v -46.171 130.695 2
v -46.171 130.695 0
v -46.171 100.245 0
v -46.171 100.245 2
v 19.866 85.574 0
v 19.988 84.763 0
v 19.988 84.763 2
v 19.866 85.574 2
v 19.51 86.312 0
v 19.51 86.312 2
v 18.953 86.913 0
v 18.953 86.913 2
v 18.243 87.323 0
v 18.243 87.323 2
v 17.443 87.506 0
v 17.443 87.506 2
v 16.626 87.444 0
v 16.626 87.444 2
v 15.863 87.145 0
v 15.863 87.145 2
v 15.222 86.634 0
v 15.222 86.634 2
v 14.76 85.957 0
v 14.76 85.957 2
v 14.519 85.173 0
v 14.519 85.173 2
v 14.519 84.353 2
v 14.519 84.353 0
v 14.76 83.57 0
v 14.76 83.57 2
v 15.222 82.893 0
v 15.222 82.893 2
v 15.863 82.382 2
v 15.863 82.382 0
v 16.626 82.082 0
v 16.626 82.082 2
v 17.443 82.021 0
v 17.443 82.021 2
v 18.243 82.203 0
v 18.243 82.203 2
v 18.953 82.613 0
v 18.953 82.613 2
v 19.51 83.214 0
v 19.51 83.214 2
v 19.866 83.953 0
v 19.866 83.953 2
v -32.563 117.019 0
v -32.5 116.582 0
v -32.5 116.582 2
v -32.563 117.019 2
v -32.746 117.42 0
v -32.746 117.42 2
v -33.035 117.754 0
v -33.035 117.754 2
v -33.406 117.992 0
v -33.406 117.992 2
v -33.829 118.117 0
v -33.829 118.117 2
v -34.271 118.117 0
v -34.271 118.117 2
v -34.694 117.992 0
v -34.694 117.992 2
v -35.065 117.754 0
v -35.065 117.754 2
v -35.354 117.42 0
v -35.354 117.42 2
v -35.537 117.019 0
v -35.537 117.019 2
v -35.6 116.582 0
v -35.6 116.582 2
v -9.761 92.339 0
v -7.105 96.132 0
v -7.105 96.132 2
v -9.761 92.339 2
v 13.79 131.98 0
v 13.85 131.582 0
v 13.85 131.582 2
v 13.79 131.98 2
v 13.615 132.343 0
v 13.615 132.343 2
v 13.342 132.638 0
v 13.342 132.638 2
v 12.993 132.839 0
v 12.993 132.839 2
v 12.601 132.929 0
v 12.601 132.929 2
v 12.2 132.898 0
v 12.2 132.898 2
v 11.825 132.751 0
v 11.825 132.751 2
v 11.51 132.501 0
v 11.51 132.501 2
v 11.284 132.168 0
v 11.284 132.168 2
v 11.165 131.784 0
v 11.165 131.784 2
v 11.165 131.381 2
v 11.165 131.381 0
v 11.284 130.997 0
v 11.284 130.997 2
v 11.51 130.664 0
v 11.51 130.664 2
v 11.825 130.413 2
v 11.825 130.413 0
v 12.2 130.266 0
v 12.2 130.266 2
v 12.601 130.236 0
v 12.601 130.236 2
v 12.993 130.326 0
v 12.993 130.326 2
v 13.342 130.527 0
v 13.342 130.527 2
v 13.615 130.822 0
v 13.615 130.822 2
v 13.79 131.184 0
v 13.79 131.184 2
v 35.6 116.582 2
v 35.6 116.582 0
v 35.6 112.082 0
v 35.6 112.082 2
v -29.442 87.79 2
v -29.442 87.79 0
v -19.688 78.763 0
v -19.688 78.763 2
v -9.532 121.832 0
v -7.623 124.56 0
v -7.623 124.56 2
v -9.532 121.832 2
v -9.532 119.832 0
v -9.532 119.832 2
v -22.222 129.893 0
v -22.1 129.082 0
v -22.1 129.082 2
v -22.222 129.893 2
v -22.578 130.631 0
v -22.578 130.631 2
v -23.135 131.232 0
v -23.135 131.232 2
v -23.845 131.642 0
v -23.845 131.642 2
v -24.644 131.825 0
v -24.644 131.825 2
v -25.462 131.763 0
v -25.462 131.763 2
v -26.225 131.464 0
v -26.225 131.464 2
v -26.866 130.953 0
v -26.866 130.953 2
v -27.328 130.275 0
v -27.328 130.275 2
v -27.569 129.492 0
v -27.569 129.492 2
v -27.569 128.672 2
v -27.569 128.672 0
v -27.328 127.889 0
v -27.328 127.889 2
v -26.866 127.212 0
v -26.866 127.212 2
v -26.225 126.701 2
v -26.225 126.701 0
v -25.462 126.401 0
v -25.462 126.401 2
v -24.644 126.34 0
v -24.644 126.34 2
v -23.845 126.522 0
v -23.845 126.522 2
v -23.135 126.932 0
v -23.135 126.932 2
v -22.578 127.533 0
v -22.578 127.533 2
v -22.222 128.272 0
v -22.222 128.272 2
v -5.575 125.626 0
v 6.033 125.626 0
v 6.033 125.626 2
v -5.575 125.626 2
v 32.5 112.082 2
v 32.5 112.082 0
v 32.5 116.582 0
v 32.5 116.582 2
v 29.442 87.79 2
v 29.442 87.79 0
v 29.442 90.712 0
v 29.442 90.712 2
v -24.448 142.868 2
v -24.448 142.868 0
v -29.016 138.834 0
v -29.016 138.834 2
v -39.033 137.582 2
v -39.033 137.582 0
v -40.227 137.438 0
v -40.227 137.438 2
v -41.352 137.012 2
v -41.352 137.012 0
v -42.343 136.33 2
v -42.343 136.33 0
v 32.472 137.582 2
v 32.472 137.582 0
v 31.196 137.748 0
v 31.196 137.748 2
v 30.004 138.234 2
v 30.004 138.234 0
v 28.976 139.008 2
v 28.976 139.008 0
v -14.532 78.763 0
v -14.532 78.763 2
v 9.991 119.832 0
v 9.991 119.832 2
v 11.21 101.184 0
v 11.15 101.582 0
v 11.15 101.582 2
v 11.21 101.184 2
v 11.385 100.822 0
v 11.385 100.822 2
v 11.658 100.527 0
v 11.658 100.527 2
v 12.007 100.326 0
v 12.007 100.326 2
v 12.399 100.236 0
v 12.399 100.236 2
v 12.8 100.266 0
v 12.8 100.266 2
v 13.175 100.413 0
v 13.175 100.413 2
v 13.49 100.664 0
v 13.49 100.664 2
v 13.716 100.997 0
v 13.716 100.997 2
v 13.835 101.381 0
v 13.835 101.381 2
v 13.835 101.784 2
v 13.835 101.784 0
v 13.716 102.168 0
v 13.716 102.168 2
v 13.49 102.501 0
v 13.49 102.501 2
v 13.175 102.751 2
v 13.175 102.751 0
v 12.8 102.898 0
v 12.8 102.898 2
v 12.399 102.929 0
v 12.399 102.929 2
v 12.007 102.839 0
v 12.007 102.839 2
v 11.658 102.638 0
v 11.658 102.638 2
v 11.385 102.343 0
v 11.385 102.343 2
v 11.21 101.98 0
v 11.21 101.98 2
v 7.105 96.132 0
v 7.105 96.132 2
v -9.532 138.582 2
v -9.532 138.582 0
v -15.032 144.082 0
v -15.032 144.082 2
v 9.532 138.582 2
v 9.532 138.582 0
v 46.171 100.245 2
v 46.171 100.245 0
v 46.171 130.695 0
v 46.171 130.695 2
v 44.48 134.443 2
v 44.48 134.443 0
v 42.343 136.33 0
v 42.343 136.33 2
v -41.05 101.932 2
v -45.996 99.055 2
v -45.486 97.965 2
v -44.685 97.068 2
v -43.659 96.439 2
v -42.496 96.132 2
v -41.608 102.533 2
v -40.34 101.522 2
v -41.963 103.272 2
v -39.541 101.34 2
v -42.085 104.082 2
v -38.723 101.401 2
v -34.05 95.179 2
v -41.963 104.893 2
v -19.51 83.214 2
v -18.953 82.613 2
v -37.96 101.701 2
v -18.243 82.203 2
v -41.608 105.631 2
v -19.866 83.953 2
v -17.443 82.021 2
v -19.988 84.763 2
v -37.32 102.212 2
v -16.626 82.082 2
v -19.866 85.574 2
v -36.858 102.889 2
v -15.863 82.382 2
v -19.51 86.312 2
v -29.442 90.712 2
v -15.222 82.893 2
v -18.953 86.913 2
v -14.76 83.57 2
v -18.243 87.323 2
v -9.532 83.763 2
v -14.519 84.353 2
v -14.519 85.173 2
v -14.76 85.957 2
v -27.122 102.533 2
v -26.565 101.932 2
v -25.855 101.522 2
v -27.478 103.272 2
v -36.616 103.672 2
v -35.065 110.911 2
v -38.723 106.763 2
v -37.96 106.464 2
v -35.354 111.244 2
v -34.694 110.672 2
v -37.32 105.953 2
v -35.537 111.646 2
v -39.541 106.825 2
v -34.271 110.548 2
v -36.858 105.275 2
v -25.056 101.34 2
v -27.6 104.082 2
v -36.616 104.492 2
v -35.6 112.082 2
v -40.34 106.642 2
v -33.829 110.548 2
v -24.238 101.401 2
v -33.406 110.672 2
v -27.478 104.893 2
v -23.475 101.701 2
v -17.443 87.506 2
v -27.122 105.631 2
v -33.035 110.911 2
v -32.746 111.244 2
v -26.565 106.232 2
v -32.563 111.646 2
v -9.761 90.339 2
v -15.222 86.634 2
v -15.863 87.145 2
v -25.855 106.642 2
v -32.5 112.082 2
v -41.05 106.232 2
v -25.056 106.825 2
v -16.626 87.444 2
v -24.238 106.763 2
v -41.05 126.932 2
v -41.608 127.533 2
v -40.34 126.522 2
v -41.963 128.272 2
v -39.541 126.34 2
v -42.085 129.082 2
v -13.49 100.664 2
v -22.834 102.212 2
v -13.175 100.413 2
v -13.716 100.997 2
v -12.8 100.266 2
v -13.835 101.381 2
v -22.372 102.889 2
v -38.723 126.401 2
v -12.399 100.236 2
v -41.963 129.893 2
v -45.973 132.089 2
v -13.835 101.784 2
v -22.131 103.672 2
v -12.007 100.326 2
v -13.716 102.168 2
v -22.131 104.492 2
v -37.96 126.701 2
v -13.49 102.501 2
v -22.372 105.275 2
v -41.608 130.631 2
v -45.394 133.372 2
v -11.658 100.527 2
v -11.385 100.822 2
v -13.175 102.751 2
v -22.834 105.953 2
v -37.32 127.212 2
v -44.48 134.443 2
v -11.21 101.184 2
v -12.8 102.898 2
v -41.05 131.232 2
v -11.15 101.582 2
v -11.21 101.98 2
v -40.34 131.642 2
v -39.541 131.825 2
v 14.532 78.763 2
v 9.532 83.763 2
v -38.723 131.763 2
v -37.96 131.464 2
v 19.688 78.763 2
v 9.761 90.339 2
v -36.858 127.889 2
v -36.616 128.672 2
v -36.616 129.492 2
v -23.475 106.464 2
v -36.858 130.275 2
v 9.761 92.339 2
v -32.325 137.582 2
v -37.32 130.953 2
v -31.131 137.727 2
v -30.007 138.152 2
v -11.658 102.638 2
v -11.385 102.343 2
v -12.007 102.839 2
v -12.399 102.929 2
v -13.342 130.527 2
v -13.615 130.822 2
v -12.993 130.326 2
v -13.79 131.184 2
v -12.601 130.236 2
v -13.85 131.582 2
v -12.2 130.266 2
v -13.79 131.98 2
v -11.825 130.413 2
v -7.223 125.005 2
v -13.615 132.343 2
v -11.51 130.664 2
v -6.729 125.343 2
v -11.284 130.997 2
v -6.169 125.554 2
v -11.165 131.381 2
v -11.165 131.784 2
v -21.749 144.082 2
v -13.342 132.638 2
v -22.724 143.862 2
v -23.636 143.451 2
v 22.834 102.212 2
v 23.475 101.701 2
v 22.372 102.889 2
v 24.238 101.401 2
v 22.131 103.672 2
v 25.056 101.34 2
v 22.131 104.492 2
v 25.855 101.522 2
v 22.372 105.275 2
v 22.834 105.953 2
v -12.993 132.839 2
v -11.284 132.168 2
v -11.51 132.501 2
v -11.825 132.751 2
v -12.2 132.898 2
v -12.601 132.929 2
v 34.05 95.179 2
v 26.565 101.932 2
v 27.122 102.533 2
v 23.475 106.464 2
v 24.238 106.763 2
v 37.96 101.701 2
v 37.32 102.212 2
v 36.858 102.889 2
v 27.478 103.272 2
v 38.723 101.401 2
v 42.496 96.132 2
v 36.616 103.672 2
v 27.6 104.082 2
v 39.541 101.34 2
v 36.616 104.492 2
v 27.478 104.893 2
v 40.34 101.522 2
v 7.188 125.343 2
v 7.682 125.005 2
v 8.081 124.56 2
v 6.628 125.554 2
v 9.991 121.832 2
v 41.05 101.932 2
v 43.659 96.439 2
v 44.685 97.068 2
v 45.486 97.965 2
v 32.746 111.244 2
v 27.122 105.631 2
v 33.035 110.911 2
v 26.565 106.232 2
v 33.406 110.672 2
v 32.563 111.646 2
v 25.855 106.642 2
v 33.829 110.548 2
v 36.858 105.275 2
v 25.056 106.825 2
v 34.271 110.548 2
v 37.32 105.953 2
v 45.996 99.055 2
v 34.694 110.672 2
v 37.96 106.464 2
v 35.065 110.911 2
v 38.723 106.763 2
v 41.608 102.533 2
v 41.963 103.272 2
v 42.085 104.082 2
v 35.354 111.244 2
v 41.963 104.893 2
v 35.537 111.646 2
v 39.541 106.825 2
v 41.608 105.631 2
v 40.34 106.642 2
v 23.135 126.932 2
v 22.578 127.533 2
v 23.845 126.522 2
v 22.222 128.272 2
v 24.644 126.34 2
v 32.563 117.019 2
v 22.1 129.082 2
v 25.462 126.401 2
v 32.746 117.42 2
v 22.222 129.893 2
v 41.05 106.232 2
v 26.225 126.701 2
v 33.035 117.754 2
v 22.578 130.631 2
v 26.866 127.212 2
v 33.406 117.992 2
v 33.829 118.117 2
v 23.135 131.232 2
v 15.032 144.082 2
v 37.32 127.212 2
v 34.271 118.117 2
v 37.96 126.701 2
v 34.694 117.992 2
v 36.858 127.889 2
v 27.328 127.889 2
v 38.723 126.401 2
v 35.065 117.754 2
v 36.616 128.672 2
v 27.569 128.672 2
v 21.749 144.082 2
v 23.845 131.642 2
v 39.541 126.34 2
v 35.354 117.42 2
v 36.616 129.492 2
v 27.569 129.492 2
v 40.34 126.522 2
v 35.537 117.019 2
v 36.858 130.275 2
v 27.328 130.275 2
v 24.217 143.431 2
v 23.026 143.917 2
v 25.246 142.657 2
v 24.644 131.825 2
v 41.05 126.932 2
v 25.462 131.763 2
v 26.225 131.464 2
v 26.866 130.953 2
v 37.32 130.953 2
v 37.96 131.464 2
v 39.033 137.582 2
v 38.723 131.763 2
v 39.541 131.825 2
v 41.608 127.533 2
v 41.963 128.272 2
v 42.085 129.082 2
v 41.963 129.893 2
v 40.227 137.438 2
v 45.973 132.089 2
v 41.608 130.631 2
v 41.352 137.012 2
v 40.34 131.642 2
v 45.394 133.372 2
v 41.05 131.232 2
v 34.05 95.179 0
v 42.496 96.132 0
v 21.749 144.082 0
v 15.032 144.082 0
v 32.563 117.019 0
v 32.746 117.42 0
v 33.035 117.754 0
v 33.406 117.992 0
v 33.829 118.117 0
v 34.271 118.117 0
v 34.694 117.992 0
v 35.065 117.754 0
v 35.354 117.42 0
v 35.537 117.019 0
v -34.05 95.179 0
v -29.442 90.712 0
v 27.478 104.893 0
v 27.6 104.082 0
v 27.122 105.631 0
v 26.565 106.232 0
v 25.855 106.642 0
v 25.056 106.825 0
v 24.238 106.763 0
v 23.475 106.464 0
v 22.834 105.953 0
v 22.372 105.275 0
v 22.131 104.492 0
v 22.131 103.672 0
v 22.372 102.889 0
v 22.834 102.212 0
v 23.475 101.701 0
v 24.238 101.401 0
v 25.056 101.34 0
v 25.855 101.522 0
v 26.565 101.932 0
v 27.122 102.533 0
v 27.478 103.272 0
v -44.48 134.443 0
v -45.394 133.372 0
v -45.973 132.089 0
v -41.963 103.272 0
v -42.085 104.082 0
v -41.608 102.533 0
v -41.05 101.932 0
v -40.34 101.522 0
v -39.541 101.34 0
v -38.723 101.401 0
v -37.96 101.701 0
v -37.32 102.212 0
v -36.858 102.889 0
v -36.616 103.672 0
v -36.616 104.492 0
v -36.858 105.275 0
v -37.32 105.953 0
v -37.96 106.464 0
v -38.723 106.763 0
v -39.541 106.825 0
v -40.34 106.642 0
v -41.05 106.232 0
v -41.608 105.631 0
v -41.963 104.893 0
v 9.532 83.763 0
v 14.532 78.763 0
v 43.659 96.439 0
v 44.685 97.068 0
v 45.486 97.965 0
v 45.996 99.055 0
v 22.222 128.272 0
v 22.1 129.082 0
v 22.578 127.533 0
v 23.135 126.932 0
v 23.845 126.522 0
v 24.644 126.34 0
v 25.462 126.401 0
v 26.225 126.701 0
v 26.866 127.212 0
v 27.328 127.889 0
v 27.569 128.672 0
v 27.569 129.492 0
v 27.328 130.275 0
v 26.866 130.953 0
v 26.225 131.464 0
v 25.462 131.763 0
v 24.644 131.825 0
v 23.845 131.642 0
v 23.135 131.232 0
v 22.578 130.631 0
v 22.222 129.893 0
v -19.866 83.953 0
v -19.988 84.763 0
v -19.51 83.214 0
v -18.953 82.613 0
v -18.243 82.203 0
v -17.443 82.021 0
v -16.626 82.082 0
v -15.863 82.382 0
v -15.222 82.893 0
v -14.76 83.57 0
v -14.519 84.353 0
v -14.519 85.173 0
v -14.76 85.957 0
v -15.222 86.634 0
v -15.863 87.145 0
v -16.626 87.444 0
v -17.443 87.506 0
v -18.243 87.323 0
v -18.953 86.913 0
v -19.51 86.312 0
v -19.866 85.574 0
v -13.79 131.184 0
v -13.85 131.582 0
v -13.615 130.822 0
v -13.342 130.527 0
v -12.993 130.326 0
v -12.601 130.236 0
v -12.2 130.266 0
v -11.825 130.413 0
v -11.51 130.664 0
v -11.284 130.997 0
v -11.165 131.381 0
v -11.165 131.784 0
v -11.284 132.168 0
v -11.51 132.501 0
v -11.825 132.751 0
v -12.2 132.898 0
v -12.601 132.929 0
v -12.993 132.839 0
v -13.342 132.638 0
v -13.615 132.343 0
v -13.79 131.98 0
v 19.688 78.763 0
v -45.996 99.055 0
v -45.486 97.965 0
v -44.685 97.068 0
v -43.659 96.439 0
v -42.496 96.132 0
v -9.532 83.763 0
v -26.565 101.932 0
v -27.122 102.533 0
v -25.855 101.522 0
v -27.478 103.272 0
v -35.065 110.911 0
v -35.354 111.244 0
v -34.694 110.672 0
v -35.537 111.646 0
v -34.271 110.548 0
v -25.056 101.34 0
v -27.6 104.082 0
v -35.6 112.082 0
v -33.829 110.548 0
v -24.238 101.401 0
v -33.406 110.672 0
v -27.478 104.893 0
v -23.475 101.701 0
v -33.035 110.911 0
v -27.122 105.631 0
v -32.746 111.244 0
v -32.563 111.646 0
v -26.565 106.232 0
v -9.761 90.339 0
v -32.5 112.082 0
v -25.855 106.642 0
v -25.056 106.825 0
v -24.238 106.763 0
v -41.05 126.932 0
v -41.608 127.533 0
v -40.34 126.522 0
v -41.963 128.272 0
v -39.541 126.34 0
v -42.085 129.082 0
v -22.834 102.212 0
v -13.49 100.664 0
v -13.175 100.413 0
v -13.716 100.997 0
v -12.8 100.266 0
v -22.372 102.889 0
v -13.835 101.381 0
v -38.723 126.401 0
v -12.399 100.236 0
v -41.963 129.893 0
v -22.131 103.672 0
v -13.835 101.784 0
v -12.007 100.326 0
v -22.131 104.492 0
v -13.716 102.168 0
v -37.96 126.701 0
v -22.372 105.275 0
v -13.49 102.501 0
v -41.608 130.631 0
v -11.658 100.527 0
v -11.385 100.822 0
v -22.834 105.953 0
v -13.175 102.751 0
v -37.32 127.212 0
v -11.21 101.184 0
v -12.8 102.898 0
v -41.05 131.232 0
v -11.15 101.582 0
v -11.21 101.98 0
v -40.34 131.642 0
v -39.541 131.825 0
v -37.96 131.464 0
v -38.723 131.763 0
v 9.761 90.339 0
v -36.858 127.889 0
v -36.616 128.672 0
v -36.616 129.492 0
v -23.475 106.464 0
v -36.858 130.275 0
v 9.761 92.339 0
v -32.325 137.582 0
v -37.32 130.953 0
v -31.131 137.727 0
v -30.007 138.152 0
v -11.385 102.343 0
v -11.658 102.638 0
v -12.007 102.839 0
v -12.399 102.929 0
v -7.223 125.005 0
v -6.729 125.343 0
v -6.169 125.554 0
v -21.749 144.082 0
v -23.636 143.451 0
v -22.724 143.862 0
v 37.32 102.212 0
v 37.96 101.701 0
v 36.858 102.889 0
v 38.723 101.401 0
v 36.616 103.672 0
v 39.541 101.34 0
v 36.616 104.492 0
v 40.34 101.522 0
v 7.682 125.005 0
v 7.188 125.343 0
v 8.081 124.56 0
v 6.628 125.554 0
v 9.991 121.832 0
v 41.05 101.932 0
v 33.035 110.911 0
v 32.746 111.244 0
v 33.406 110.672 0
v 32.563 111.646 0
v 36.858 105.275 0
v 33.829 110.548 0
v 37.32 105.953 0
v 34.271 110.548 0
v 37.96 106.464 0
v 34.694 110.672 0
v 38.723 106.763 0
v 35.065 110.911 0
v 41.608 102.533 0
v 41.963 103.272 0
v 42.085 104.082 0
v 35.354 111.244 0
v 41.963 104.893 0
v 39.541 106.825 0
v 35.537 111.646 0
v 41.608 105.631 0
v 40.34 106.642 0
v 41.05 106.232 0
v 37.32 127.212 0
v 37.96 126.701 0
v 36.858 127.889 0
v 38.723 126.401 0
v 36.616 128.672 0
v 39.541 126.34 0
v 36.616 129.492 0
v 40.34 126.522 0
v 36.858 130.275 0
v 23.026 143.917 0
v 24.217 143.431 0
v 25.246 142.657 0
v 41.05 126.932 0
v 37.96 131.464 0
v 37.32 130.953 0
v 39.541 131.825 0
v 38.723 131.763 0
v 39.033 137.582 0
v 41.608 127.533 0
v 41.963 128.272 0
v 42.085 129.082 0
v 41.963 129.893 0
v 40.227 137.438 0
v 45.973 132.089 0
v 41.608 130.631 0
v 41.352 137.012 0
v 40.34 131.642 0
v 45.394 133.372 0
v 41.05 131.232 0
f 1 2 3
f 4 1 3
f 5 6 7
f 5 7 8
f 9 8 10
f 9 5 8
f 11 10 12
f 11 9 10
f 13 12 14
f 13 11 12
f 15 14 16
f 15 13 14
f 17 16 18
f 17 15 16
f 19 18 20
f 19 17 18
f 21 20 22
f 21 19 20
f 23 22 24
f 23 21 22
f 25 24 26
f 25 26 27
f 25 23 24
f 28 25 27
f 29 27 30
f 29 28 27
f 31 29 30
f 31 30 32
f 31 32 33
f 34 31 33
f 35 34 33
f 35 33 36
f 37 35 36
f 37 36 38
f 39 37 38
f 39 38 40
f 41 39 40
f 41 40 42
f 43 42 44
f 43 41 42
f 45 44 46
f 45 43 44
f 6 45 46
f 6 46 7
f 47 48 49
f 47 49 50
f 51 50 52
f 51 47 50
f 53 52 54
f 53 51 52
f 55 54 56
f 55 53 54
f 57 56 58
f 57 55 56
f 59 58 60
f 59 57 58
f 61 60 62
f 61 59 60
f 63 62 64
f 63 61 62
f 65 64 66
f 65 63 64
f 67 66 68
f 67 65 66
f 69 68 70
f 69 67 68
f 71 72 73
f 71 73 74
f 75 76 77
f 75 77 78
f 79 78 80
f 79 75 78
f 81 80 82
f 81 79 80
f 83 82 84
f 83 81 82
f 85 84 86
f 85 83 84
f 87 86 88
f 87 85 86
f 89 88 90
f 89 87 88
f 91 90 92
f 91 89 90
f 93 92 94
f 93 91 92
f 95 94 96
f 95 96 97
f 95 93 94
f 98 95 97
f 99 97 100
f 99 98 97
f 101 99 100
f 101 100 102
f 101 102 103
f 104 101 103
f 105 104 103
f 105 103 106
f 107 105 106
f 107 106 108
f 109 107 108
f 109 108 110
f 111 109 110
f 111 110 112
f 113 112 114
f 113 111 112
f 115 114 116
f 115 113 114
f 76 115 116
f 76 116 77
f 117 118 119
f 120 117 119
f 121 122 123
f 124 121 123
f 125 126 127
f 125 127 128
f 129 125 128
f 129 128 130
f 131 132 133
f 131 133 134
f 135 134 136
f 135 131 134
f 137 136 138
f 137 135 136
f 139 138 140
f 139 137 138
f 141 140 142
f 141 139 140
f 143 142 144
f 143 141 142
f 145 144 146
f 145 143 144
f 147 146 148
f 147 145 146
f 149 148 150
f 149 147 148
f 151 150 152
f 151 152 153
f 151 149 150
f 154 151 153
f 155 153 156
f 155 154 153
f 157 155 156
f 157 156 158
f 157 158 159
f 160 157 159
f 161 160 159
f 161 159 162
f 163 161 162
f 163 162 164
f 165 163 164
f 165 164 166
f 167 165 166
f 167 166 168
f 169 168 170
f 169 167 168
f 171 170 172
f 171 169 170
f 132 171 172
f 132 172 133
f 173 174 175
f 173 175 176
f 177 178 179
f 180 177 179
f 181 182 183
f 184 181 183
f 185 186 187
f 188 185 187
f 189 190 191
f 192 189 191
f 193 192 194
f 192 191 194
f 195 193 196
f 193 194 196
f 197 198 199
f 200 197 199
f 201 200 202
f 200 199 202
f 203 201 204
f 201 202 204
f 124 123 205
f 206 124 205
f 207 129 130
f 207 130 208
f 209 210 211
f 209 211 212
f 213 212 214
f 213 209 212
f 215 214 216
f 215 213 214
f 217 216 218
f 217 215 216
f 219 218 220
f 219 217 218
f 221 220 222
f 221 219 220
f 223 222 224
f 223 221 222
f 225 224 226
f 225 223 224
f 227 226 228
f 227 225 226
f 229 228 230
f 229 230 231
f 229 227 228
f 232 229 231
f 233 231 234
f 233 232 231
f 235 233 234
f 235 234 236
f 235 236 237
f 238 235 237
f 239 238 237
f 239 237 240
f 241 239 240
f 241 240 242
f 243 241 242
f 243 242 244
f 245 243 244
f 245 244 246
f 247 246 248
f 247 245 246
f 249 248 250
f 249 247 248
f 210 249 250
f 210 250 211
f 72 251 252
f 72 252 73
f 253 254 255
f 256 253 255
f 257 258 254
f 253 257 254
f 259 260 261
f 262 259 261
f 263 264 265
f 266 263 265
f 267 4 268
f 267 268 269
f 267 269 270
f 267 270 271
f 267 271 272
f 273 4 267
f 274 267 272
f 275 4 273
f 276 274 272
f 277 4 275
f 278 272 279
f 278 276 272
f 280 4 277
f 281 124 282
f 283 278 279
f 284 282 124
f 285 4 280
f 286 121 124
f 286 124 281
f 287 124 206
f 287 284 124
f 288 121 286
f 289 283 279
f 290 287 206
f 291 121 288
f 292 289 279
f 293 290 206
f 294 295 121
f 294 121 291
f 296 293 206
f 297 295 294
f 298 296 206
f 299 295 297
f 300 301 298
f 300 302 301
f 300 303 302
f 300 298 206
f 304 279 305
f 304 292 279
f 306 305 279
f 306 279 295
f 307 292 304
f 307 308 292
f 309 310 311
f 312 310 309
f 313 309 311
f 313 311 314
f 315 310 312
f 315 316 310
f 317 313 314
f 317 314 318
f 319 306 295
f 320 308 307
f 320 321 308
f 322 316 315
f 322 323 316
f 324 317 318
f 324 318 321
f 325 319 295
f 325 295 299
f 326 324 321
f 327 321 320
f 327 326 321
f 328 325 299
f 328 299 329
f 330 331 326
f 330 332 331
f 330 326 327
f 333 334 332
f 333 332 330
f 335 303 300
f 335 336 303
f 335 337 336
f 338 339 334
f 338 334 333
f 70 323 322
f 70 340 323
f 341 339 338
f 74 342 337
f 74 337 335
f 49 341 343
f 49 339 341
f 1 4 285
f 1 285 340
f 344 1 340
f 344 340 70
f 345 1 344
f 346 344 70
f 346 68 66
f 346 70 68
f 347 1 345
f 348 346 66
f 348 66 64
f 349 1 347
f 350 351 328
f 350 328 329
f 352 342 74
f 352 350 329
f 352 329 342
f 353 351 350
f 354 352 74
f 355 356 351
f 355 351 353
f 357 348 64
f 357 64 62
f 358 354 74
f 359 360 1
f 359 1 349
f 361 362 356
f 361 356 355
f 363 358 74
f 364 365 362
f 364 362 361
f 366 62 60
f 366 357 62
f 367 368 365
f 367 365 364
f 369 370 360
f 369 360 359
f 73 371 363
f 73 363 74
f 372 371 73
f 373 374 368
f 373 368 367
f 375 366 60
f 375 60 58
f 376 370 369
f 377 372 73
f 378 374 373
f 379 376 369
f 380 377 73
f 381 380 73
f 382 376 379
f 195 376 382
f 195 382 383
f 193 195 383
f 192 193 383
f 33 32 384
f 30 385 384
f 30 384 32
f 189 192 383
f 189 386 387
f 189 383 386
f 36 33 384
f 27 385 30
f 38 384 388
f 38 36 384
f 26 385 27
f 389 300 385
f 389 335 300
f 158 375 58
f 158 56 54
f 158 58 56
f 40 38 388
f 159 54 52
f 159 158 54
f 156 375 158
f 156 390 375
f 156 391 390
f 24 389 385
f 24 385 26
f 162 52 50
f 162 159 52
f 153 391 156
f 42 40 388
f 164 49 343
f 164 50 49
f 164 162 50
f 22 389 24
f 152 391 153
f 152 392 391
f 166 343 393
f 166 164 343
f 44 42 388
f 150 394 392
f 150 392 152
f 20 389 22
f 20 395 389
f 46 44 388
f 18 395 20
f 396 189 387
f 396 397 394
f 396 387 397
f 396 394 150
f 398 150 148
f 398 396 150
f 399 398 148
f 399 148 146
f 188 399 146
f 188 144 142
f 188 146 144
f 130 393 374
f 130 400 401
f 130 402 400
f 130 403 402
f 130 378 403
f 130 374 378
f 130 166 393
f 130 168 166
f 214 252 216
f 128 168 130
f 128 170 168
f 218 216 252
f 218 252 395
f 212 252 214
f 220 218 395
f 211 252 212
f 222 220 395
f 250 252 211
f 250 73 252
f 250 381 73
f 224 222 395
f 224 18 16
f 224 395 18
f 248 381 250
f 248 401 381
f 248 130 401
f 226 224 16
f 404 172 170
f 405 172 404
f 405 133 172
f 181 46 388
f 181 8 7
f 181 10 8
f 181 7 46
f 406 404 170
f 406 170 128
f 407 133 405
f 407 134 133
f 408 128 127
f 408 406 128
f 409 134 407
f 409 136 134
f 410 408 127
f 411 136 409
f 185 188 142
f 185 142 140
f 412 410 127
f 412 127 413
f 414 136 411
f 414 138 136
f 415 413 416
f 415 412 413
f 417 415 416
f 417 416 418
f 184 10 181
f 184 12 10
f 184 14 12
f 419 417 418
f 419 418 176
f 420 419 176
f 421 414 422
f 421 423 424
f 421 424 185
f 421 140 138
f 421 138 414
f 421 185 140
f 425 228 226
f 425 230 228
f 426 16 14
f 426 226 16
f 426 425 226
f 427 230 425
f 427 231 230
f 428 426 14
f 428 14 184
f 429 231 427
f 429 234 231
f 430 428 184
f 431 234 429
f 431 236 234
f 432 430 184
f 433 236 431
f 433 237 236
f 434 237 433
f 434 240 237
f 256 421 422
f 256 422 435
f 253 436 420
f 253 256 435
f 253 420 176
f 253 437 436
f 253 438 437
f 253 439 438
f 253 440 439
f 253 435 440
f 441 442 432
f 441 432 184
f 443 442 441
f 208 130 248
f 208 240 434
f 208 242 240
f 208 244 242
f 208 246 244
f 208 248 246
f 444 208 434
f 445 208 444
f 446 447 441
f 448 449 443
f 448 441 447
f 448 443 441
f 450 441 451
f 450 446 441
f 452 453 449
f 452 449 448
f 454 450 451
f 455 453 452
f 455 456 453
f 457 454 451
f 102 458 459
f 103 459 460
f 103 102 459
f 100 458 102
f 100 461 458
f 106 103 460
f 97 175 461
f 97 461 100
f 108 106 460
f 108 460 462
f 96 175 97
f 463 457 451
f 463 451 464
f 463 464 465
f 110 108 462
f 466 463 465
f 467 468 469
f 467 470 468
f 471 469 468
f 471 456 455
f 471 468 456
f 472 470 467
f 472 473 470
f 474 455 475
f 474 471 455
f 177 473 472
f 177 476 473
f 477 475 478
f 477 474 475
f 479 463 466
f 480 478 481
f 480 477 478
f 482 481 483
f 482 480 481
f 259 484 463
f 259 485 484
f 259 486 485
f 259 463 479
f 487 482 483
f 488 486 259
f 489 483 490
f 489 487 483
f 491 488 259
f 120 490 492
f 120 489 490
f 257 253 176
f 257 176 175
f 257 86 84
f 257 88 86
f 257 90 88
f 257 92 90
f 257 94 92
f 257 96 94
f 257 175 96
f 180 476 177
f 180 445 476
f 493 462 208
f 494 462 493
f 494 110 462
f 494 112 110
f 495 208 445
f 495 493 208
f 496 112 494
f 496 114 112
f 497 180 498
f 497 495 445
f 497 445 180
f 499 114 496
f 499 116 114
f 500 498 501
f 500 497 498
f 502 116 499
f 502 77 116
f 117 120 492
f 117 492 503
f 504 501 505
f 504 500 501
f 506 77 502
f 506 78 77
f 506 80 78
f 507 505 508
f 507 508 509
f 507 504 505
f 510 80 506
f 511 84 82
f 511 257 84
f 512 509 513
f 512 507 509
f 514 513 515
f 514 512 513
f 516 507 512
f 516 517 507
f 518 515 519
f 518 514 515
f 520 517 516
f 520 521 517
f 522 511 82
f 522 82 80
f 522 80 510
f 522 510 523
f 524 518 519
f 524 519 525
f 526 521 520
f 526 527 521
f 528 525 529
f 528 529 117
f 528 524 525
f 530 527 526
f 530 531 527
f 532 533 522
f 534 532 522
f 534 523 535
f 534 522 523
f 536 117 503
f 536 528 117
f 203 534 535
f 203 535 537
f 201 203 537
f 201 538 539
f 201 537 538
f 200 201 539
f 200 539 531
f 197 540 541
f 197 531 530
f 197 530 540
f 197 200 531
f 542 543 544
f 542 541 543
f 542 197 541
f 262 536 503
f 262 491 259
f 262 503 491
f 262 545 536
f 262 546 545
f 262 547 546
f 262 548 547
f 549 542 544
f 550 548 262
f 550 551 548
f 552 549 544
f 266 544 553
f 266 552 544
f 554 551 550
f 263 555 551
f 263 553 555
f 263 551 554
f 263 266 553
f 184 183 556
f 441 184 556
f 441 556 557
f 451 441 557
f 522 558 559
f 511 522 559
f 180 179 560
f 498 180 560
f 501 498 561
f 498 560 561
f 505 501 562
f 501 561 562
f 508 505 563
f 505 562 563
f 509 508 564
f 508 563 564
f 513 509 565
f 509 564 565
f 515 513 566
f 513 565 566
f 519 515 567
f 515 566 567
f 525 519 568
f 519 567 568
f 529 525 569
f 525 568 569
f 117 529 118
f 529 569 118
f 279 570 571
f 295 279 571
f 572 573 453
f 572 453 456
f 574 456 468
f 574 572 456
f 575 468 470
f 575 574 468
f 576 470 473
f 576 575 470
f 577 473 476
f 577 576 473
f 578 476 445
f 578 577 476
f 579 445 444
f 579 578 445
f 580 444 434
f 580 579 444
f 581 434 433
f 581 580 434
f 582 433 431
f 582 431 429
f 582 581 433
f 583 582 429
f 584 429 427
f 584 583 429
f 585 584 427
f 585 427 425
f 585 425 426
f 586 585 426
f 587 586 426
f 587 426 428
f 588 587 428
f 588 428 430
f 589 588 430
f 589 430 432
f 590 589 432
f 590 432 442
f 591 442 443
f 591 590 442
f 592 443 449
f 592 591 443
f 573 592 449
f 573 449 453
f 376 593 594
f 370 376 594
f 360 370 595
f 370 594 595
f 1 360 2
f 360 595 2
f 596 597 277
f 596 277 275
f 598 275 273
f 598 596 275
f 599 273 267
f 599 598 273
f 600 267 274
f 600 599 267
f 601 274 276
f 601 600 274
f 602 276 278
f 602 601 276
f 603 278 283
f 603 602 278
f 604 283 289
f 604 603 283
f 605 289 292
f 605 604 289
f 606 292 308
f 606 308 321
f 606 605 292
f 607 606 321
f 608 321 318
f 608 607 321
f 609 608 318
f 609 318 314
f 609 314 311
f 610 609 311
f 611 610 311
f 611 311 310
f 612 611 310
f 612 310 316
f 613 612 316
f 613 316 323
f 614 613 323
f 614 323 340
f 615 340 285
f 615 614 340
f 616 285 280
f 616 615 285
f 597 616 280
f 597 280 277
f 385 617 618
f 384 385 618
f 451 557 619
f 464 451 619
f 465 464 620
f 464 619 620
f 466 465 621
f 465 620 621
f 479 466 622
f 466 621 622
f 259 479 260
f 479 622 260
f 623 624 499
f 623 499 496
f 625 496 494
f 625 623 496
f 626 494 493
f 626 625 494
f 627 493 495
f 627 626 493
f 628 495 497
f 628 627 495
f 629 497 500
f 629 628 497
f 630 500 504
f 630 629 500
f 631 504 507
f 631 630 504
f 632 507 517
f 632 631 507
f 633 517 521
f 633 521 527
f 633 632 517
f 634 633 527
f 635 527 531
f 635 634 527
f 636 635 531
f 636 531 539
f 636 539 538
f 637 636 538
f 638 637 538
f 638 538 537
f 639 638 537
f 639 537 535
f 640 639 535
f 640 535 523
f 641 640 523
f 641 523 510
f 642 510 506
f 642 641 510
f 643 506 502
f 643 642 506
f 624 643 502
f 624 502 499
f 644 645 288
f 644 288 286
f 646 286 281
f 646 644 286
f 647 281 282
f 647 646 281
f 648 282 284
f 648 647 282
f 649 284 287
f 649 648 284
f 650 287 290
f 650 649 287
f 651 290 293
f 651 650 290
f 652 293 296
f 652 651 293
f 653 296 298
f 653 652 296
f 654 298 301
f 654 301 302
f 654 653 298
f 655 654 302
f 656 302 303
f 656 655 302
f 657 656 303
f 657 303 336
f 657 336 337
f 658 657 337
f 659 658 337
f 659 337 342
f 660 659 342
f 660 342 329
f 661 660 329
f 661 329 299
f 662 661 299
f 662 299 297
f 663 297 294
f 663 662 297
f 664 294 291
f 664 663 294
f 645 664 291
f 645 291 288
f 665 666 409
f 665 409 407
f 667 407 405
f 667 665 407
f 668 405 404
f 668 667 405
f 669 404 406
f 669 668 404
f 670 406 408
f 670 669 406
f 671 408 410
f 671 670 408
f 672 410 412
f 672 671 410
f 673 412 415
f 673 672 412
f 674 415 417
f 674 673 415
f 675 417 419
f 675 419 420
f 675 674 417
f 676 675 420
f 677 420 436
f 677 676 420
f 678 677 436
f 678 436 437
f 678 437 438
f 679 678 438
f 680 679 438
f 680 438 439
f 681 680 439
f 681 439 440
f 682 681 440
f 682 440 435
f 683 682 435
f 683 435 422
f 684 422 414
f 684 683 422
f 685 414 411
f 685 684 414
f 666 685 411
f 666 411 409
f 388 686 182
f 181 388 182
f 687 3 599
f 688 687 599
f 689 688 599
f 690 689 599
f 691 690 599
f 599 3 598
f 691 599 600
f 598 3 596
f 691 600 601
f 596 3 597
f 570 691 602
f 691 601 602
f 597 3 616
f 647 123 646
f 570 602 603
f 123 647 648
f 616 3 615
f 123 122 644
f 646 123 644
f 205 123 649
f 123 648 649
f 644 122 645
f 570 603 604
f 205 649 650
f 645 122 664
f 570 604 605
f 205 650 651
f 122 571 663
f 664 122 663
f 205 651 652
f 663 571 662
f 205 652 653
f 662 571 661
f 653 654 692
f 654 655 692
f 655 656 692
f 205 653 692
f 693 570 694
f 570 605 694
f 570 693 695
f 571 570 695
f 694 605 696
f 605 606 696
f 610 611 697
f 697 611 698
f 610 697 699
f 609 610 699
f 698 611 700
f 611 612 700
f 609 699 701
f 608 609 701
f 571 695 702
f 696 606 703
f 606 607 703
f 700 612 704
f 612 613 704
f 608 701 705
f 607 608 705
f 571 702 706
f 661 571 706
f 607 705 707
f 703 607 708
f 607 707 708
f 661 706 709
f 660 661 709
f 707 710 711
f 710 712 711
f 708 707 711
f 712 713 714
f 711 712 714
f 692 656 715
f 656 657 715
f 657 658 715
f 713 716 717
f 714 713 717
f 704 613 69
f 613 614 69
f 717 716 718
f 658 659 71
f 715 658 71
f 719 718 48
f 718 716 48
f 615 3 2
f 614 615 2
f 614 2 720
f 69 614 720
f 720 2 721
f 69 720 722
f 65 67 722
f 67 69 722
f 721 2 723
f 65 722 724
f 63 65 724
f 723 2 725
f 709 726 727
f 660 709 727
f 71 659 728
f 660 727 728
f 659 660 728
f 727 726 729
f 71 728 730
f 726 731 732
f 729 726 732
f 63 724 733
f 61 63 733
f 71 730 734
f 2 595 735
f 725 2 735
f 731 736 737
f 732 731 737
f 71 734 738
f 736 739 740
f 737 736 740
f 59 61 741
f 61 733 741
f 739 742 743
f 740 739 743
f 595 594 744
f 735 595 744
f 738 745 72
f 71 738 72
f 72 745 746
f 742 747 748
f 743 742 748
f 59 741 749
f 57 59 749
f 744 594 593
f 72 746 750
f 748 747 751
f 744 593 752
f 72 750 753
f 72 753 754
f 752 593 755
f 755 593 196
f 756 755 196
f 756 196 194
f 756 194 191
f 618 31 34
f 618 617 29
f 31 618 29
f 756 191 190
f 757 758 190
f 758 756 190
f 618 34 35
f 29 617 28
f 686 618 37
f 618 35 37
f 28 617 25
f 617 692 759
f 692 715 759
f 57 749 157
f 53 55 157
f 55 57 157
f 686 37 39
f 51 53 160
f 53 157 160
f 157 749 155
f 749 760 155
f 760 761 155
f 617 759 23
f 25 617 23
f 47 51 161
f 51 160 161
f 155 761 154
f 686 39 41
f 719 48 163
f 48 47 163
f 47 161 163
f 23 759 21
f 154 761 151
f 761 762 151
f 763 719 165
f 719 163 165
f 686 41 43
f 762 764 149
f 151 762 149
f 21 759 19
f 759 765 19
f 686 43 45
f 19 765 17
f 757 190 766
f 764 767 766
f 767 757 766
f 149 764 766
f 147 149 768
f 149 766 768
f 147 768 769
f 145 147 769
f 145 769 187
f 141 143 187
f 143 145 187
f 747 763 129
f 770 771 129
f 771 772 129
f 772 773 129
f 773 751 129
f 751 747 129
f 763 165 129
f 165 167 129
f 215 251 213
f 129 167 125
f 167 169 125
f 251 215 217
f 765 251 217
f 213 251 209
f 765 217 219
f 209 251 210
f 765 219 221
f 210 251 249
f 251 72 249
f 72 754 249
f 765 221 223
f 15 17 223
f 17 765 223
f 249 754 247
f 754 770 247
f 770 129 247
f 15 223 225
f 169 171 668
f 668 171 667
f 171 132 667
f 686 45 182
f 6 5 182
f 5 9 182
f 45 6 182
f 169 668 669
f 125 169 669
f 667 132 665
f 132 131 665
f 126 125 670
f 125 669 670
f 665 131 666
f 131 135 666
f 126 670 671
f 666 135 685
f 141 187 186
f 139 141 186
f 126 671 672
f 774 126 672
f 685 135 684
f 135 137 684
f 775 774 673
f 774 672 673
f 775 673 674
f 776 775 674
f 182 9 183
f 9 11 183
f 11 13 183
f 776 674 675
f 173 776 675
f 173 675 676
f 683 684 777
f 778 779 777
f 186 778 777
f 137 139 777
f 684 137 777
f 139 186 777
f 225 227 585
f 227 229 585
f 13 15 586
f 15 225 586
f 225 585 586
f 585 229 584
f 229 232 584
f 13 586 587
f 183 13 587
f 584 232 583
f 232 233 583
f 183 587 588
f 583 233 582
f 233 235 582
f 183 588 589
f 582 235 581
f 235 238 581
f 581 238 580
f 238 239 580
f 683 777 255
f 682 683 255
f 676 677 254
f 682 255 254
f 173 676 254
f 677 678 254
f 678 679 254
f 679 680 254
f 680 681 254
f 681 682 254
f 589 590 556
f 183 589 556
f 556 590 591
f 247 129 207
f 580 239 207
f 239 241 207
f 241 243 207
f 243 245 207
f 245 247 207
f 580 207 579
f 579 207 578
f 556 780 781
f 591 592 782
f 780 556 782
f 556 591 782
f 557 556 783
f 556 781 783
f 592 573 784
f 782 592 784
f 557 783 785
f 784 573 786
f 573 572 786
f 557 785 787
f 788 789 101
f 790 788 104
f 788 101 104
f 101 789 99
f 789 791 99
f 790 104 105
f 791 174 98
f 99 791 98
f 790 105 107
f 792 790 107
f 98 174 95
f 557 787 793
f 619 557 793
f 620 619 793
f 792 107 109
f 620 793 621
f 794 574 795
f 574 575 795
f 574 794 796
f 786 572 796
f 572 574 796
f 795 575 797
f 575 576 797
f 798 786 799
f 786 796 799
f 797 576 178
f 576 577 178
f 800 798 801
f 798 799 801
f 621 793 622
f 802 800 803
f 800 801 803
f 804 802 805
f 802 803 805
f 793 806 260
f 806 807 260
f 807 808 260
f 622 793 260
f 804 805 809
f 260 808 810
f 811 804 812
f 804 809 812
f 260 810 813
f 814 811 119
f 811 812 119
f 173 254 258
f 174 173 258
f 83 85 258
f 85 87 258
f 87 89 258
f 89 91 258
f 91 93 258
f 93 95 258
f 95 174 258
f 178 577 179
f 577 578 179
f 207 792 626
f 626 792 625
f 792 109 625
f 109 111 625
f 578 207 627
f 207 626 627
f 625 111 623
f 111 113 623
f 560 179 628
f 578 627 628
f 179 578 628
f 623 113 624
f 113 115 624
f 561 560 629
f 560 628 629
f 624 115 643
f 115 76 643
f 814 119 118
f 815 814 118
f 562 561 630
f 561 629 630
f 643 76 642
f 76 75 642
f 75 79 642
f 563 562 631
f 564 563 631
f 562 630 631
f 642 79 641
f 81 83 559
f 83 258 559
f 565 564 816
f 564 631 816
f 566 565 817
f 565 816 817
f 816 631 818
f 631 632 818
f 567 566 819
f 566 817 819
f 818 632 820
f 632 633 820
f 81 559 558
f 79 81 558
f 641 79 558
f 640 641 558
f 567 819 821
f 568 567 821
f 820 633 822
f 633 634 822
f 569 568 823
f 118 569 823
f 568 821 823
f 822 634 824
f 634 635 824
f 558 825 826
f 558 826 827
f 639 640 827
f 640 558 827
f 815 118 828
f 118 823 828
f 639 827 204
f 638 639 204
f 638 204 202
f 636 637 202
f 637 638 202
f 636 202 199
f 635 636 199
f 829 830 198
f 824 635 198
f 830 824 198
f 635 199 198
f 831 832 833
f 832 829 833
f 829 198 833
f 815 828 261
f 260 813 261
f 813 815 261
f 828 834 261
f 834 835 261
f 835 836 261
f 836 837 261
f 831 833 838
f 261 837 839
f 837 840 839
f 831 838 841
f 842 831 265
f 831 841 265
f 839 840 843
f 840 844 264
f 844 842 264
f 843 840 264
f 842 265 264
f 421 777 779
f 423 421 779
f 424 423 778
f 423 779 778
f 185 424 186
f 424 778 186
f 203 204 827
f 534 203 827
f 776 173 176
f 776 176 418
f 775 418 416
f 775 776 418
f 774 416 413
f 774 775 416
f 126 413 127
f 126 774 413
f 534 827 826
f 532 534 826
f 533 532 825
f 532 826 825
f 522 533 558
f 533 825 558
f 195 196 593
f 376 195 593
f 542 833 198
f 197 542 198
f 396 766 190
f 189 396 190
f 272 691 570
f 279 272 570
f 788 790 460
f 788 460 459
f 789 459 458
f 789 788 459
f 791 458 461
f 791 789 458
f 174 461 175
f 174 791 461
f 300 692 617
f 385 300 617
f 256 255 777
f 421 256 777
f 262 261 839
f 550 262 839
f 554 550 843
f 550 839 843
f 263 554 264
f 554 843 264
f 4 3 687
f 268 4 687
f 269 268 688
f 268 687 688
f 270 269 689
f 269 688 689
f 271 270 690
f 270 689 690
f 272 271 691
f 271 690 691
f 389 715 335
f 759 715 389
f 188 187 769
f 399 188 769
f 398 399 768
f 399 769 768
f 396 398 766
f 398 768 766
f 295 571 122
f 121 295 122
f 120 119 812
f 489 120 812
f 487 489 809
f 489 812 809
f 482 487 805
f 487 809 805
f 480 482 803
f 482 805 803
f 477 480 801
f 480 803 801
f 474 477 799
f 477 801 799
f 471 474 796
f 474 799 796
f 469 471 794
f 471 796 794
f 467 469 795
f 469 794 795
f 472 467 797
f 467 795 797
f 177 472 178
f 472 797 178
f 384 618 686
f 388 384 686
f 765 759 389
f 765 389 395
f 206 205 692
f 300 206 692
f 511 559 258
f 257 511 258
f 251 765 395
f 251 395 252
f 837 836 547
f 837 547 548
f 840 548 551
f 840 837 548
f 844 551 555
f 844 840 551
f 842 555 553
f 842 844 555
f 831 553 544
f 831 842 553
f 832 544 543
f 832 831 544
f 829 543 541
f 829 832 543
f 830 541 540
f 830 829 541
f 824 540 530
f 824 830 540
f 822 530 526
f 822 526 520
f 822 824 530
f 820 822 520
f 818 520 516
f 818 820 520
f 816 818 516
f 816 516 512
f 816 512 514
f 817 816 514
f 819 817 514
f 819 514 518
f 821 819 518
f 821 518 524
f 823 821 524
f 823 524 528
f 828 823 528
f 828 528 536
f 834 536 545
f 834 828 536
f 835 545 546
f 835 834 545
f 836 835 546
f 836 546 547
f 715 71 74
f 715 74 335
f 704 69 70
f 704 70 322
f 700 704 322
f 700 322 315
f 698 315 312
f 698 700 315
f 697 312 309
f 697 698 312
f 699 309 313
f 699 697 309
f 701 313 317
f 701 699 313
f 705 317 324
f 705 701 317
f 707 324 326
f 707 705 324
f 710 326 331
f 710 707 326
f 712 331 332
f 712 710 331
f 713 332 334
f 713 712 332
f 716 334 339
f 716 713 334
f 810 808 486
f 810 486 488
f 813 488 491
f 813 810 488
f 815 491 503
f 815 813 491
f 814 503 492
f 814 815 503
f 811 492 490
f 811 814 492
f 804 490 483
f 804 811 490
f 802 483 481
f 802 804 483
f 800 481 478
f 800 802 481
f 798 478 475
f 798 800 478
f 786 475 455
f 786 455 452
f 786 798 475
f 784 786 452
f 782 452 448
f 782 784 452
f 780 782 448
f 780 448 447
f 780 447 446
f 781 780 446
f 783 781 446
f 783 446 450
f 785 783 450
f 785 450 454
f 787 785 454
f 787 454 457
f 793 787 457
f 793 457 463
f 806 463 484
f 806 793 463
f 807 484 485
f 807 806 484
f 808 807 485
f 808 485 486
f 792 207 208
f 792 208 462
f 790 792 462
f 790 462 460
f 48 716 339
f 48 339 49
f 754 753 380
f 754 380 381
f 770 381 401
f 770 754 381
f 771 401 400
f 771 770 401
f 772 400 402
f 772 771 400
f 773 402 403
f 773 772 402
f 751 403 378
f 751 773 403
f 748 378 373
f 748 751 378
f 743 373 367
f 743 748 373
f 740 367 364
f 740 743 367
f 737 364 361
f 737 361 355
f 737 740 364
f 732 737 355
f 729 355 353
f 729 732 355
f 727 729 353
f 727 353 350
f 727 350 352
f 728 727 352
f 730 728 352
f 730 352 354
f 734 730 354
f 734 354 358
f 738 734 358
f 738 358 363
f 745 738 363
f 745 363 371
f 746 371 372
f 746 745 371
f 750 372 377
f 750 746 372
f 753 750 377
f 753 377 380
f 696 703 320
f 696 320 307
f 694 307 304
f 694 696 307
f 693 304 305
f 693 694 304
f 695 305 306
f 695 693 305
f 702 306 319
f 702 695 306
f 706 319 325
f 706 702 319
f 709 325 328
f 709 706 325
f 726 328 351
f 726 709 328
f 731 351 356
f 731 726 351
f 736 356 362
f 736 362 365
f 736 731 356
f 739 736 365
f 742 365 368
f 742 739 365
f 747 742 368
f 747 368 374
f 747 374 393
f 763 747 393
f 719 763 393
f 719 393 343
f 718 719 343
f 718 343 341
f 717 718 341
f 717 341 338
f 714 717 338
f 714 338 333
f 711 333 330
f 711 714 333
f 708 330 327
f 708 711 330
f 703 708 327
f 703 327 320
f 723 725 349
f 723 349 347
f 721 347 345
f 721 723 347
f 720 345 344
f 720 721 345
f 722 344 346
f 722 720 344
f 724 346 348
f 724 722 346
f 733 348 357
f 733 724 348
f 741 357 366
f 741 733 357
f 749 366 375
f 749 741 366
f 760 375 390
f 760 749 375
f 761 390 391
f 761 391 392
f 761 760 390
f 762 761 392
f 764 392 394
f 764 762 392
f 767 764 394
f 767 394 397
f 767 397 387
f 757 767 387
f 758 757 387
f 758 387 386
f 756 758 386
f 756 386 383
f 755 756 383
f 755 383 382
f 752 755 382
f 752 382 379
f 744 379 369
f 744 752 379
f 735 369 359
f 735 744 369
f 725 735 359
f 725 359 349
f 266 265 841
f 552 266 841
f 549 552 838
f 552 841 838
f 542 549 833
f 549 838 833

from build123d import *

# Parameters (mm, degrees)
SKETCH_187_R    = 2.75
SKETCH_187_R_2  = 1.35
EXTRUDE_1_DEPTH = 2


with BuildPart() as part:
    # Sketch 187 → 凸台-拉伸1 (new body)
    with BuildSketch(Plane.XY):
        with BuildLine():
            Line((-24.447800114, 142.867788384), (-29.015821613, 138.834288737))
            ThreePointArc((-29.015821613, 138.834288737), (-30.556091587, 137.905760103), (-32.325263946, 137.582300402))
            Line((-32.325263946, 137.582300402), (-39.033457742, 137.582300402))
            ThreePointArc((-39.033457742, 137.582300402), (-40.802630101, 137.2588407), (-42.342900075, 136.330312067))
            Line((-42.342900075, 136.330312067), (-44.480254451, 134.443057788))
            ThreePointArc((-44.480254451, 134.443057788), (-45.728619247, 132.750865708), (-46.170812117, 130.695046123))
            Line((-46.170812117, 130.695046123), (-46.170812117, 100.244585214))
            ThreePointArc((-46.170812117, 100.244585214), (-45.11839985, 97.487233211), (-42.496431366, 96.132300402))
            Line((-42.496431366, 96.132300402), (-34.05, 95.17927075))
            Line((-34.05, 95.17927075), (-29.442356392, 90.712497735))
            Line((-29.442356392, 90.712497735), (-29.442356392, 87.789843939))
            Line((-29.442356392, 87.789843939), (-19.688242157, 78.763336754))
            Line((-19.688242157, 78.763336754), (-14.532154357, 78.763336754))
            Line((-14.532154357, 78.763336754), (-9.532154357, 83.763336754))
            Line((-9.532154357, 83.763336754), (9.532154357, 83.763336754))
            Line((9.532154357, 83.763336754), (14.532154357, 78.763336754))
            Line((14.532154357, 78.763336754), (19.688242157, 78.763336754))
            Line((19.688242157, 78.763336754), (29.442356392, 87.789843939))
            Line((29.442356392, 87.789843939), (29.442356392, 90.712497735))
            Line((29.442356392, 90.712497735), (34.05, 95.17927075))
            Line((34.05, 95.17927075), (42.496431366, 96.132300402))
            ThreePointArc((42.496431366, 96.132300402), (45.11839985, 97.487233211), (46.170812117, 100.244585214))
            Line((46.170812117, 100.244585214), (46.170812117, 130.695046123))
            ThreePointArc((46.170812117, 130.695046123), (45.728619247, 132.750865708), (44.480254451, 134.443057788))
            Line((44.480254451, 134.443057788), (42.342900075, 136.330312067))
            ThreePointArc((42.342900075, 136.330312067), (40.802630101, 137.2588407), (39.033457742, 137.582300402))
            Line((39.033457742, 137.582300402), (32.472417217, 137.582300402))
            ThreePointArc((32.472417217, 137.582300402), (30.584617738, 137.952374579), (28.976268595, 139.007815151))
            Line((28.976268595, 139.007815151), (25.245537252, 142.656785653))
            ThreePointArc((25.245537252, 142.656785653), (23.637188108, 143.712226225), (21.74938863, 144.082300402))
            Line((21.74938863, 144.082300402), (15.032154357, 144.082300402))
            Line((15.032154357, 144.082300402), (9.532154357, 138.582300402))
            Line((9.532154357, 138.582300402), (-9.532154357, 138.582300402))
            Line((-9.532154357, 138.582300402), (-15.032154357, 144.082300402))
            Line((-15.032154357, 144.082300402), (-21.74938863, 144.082300402))
            ThreePointArc((-21.74938863, 144.082300402), (-23.190499918, 143.679240794), (-24.447800114, 142.867788384))
        make_face()
        with Locations((39.335406059, 129.082300402)):
            Circle(SKETCH_187_R, mode=Mode.SUBTRACT)
        with Locations((39.335406059, 104.082300402)):
            Circle(SKETCH_187_R, mode=Mode.SUBTRACT)
        with Locations((17.23796389, 84.763336754)):
            Circle(SKETCH_187_R, mode=Mode.SUBTRACT)
        with Locations(Location((-17.23796389, 84.763336754, 0), (0, 0, 180))):
            Circle(SKETCH_187_R, mode=Mode.SUBTRACT)
        with Locations(Location((-39.335406059, 104.082300402, 0), (0, 0, 180))):
            Circle(SKETCH_187_R, mode=Mode.SUBTRACT)
        with Locations(Location((-39.335406059, 129.082300402, 0), (0, 0, 180))):
            Circle(SKETCH_187_R, mode=Mode.SUBTRACT)
        with Locations(Location((24.85, 129.082300402, 0), (0, 0, 180))):
            Circle(SKETCH_187_R, mode=Mode.SUBTRACT)
        with Locations((-24.85, 129.082300402)):
            Circle(SKETCH_187_R, mode=Mode.SUBTRACT)
        with Locations(Location((-24.85, 104.082300402, 0), (0, 0, 180))):
            Circle(SKETCH_187_R, mode=Mode.SUBTRACT)
        with Locations((24.85, 104.082300402)):
            Circle(SKETCH_187_R, mode=Mode.SUBTRACT)
        with Locations((12.5, 131.582300402)):
            Circle(SKETCH_187_R_2, mode=Mode.SUBTRACT)
        with Locations(Location((-12.5, 131.582300402, 0), (0, 0, 180))):
            Circle(SKETCH_187_R_2, mode=Mode.SUBTRACT)
        with Locations((-12.5, 101.582300402)):
            Circle(SKETCH_187_R_2, mode=Mode.SUBTRACT)
        with Locations(Location((12.5, 101.582300402, 0), (0, 0, 180))):
            Circle(SKETCH_187_R_2, mode=Mode.SUBTRACT)
        Polygon((7.105388598, 96.132300402), (-7.105388598, 96.132300402), (-9.761471208, 92.339021317), (-9.761471208, 90.339021317), (9.761471208, 90.339021317), (9.761471208, 92.339021317), align=None, mode=Mode.SUBTRACT)
        with BuildLine():
            Line((-35.6, 116.582300402), (-35.6, 112.082300402))
            ThreePointArc((-35.6, 112.082300402), (-34.05, 110.532300402), (-32.5, 112.082300402))
            Line((-32.5, 112.082300402), (-32.5, 116.582300402))
            ThreePointArc((-32.5, 116.582300402), (-34.05, 118.132300402), (-35.6, 116.582300402))
        make_face(mode=Mode.SUBTRACT)
        with BuildLine():
            Line((35.6, 116.582300402), (35.6, 112.082300402))
            ThreePointArc((35.6, 112.082300402), (34.05, 110.532300402), (32.5, 112.082300402))
            Line((32.5, 112.082300402), (32.5, 116.582300402))
            ThreePointArc((32.5, 116.582300402), (34.05, 118.132300402), (35.6, 116.582300402))
        make_face(mode=Mode.SUBTRACT)
        with BuildLine():
            Line((6.033287824, 125.625579487), (-5.574654121, 125.625579487))
            ThreePointArc((-5.574654121, 125.625579487), (-6.729025654, 125.34310657), (-7.622534231, 124.559520578))
            Line((-7.622534231, 124.559520578), (-9.532154357, 121.832300402))
            Line((-9.532154357, 121.832300402), (-9.532154357, 119.832300402))
            Line((-9.532154357, 119.832300402), (9.99078806, 119.832300402))
            Line((9.99078806, 119.832300402), (9.99078806, 121.832300402))
            Line((9.99078806, 121.832300402), (8.081167934, 124.559520578))
            ThreePointArc((8.081167934, 124.559520578), (7.187659357, 125.34310657), (6.033287824, 125.625579487))
        make_face(mode=Mode.SUBTRACT)
    extrude(amount=EXTRUDE_1_DEPTH)


solid = part.part
